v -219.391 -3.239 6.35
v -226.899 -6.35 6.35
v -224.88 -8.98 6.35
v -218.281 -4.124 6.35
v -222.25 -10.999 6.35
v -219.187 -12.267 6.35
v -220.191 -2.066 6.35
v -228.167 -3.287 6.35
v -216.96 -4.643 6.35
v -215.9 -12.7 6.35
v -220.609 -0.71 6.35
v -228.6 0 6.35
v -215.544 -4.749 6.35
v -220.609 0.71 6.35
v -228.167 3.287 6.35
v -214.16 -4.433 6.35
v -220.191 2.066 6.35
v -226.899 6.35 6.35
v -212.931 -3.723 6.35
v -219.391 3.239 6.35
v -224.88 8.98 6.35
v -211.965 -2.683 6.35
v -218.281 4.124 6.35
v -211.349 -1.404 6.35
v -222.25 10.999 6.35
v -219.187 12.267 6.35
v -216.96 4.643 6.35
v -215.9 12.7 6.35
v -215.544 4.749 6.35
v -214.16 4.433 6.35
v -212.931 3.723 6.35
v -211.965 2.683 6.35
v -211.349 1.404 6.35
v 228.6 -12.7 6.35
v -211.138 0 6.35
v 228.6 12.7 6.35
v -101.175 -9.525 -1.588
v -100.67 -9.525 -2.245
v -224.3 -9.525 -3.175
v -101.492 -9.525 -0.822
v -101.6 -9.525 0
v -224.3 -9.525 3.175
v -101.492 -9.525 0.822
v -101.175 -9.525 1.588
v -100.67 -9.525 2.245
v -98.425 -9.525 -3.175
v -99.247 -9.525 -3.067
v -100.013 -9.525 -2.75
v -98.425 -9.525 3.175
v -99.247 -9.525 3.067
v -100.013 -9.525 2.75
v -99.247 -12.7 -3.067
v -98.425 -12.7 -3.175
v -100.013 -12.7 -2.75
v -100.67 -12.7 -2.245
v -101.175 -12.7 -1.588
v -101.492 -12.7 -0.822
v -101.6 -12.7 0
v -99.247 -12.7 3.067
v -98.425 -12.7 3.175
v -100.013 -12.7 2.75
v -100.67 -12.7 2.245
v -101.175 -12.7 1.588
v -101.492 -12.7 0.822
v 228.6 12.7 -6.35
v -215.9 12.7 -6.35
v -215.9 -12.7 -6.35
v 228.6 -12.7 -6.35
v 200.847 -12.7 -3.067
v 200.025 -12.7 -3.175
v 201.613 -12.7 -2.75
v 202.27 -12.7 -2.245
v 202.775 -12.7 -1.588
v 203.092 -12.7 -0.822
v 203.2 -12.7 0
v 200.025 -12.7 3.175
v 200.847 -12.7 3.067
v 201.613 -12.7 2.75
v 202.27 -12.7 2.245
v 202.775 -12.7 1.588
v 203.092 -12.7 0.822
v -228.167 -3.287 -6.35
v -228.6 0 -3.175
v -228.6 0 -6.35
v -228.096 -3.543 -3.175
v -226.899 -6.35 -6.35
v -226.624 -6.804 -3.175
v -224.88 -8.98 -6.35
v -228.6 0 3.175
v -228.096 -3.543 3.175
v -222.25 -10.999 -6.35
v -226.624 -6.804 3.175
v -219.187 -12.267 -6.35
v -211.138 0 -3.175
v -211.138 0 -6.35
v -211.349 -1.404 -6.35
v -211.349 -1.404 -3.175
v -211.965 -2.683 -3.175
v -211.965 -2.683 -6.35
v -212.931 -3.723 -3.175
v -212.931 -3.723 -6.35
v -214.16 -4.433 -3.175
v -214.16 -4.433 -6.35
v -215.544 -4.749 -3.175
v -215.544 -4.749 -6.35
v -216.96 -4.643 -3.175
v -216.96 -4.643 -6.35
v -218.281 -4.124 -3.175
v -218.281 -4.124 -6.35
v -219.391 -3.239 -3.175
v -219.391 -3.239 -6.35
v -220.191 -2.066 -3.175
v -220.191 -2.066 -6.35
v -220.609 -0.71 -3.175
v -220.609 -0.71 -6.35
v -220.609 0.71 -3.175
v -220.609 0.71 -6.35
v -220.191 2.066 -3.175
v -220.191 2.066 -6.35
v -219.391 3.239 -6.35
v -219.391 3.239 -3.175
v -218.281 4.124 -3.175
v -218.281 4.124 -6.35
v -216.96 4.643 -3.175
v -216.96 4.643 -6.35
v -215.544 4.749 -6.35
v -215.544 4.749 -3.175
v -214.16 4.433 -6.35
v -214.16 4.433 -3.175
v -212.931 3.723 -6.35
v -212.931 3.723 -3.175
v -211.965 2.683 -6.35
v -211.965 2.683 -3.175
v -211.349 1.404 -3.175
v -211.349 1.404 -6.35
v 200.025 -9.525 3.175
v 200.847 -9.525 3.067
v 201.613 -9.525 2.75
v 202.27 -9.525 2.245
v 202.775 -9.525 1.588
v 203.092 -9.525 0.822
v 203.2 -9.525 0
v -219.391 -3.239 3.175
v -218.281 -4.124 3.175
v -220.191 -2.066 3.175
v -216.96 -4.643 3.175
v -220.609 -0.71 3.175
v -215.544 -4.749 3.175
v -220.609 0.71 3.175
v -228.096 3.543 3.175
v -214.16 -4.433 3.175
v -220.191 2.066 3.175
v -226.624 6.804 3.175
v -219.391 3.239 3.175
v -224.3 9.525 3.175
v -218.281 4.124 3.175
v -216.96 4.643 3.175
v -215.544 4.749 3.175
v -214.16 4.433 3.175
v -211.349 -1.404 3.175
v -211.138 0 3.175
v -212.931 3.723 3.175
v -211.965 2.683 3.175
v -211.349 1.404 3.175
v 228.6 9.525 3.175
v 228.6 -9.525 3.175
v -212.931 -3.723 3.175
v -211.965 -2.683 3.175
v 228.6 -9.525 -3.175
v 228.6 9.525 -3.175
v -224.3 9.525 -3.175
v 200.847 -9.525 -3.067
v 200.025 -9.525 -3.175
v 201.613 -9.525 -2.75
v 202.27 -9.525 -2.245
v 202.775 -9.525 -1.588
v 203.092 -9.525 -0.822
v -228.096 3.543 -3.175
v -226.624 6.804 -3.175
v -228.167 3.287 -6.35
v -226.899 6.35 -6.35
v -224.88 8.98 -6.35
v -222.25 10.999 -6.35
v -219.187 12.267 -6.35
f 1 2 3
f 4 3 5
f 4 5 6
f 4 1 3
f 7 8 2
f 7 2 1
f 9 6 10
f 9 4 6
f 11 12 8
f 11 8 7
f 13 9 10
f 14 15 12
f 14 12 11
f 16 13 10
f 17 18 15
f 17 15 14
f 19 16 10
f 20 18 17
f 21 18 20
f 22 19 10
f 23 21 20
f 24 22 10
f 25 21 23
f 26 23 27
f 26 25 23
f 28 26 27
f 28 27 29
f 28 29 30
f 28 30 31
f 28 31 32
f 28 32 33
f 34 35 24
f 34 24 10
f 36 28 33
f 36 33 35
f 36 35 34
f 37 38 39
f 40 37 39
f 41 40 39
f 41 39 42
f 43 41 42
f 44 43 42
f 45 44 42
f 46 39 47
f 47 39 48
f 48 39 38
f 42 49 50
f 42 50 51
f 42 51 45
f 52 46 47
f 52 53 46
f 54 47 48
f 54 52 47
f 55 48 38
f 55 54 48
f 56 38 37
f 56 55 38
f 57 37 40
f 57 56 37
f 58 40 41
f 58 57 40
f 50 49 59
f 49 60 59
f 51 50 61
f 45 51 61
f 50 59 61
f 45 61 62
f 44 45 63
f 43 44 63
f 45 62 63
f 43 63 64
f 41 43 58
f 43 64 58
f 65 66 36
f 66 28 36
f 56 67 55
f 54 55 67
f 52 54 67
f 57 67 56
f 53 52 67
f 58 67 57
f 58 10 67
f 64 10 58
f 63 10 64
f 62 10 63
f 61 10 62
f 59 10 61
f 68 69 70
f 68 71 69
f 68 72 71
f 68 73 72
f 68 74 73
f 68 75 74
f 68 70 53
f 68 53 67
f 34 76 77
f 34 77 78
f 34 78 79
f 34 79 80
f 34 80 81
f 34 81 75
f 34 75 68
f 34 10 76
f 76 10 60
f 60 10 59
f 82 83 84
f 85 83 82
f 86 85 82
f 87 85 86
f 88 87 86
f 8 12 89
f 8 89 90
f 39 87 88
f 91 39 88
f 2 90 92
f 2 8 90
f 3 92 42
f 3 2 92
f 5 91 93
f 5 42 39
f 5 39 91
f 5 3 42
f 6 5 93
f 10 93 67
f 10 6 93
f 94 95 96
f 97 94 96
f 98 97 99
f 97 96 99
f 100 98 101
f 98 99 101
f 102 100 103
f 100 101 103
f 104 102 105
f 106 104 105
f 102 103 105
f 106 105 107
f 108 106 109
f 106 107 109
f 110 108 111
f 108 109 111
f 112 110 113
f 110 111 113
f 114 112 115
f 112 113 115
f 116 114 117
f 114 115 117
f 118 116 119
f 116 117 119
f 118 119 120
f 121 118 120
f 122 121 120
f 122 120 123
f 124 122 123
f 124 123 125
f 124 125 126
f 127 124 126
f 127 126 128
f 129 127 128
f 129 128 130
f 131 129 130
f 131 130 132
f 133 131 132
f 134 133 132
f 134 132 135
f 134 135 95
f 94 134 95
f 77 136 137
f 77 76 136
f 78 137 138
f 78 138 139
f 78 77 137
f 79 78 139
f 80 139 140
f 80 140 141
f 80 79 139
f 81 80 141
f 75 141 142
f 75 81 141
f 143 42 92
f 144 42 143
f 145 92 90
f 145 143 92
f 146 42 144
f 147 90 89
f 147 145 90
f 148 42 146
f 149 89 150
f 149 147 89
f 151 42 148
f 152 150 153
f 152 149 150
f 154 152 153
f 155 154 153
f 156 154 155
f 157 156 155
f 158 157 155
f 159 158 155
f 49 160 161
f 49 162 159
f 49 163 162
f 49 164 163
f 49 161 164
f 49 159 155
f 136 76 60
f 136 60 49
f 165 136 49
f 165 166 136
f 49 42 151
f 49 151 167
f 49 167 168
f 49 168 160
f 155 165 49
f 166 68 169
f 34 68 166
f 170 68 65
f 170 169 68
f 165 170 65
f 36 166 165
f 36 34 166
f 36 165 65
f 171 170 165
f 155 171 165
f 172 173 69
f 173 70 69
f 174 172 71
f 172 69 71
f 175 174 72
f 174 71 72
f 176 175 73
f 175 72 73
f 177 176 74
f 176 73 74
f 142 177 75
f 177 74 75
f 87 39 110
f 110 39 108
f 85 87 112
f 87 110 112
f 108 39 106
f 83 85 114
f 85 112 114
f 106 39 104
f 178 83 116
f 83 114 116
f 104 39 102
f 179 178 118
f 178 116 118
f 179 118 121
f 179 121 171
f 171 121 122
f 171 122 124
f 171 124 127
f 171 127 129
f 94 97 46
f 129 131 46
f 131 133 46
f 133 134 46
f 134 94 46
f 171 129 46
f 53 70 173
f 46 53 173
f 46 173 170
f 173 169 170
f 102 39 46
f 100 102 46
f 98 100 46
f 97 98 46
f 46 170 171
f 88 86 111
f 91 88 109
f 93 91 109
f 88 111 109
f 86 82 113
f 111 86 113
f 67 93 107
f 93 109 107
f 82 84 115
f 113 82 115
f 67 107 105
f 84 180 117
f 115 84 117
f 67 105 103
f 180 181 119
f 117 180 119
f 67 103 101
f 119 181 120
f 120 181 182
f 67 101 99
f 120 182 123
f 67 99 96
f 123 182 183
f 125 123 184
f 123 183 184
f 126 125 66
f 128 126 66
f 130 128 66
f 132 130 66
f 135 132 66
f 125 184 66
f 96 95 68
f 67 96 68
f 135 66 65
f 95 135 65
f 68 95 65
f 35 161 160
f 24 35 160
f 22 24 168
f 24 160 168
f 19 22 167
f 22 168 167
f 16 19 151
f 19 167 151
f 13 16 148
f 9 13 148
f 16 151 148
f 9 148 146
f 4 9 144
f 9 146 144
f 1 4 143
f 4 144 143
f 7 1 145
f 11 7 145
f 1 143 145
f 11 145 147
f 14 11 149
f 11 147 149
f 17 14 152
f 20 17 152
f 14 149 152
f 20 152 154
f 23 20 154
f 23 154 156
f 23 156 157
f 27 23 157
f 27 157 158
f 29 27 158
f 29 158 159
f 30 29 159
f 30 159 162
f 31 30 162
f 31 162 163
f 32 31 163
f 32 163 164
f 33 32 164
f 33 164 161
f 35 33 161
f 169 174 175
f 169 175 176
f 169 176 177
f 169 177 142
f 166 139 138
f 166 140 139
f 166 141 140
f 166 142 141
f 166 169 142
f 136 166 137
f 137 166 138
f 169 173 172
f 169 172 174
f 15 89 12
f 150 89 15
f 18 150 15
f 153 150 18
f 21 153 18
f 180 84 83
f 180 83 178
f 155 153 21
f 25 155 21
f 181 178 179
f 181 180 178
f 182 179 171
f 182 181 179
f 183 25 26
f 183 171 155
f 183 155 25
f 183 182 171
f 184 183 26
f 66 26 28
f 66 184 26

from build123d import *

# Parameters (mm, degrees)
F0_W          = 457.2
F0_H          = 25.4
F1_DEPTH      = 6.35
F2_R          = 12.69999
F3_R          = 4.7625
F4_DEPTH      = 12.701
F5_W          = 19.05
F5_H          = 6.35
F6_DEPTH      = 228.601
F6_DEPTH_BACK = 228.601
F7_W          = 304.8
F7_H          = 6.35
F8_DEPTH      = 12.701
F9_R          = 3.17499


# Not quite as in the source:
# - a fillet or chamfer is up to 0.001 mm smaller than in the source, because OpenCascade refuses the exact size


with BuildPart() as f1:
    # F0 (on Top) → F1 (new body, symmetric)
    with BuildSketch(Plane.XY):
        Rectangle(F0_W, F0_H)
    extrude(amount=F1_DEPTH, both=True)

    # F2 (radius 12.7 in the source; OpenCascade refuses exactly that, so slightly less here)
    f2_edges = [f1.edges().sort_by_distance(p)[0] for p in [
        (-228.6, 12.7, 0),
        (-228.6, -12.7, 0),
    ]]
    fillet(f2_edges, radius=F2_R)

    # F3 (on face) → F4 (cut, through all)
    with BuildSketch(Plane(origin=(0, 0, -6.35), x_dir=(1, 0, 0), z_dir=(0, 0, -1))):
        with Locations((-215.9, 0)):
            Circle(F3_R)
    extrude(amount=-F4_DEPTH, mode=Mode.SUBTRACT)

    # F5 (on Right) → F6 (cut, two sides)
    with BuildSketch(Plane.YZ) as f6_sk:
        Rectangle(F5_W, F5_H)
    extrude(amount=-F6_DEPTH, mode=Mode.SUBTRACT)
    extrude(f6_sk.sketch, amount=F6_DEPTH_BACK, mode=Mode.SUBTRACT)

    # F7 (on Front) → F8 (cut, through all)
    with BuildSketch(Plane.XZ):
        with Locations((50.8, 0)):
            Rectangle(F7_W, F7_H)
    extrude(amount=F8_DEPTH, mode=Mode.SUBTRACT)

    # F9 (radius 3.175 in the source; OpenCascade refuses exactly that, so slightly less here)
    f9_edges = [f1.edges().sort_by_distance(p)[0] for p in [
        (-101.6, -11.1125, 3.175),
        (203.2, -11.1125, -3.175),
        (203.2, -11.1125, 3.175),
        (-101.6, -11.1125, -3.175),
    ]]
    fillet(f9_edges, radius=F9_R)


solid = f1.part
